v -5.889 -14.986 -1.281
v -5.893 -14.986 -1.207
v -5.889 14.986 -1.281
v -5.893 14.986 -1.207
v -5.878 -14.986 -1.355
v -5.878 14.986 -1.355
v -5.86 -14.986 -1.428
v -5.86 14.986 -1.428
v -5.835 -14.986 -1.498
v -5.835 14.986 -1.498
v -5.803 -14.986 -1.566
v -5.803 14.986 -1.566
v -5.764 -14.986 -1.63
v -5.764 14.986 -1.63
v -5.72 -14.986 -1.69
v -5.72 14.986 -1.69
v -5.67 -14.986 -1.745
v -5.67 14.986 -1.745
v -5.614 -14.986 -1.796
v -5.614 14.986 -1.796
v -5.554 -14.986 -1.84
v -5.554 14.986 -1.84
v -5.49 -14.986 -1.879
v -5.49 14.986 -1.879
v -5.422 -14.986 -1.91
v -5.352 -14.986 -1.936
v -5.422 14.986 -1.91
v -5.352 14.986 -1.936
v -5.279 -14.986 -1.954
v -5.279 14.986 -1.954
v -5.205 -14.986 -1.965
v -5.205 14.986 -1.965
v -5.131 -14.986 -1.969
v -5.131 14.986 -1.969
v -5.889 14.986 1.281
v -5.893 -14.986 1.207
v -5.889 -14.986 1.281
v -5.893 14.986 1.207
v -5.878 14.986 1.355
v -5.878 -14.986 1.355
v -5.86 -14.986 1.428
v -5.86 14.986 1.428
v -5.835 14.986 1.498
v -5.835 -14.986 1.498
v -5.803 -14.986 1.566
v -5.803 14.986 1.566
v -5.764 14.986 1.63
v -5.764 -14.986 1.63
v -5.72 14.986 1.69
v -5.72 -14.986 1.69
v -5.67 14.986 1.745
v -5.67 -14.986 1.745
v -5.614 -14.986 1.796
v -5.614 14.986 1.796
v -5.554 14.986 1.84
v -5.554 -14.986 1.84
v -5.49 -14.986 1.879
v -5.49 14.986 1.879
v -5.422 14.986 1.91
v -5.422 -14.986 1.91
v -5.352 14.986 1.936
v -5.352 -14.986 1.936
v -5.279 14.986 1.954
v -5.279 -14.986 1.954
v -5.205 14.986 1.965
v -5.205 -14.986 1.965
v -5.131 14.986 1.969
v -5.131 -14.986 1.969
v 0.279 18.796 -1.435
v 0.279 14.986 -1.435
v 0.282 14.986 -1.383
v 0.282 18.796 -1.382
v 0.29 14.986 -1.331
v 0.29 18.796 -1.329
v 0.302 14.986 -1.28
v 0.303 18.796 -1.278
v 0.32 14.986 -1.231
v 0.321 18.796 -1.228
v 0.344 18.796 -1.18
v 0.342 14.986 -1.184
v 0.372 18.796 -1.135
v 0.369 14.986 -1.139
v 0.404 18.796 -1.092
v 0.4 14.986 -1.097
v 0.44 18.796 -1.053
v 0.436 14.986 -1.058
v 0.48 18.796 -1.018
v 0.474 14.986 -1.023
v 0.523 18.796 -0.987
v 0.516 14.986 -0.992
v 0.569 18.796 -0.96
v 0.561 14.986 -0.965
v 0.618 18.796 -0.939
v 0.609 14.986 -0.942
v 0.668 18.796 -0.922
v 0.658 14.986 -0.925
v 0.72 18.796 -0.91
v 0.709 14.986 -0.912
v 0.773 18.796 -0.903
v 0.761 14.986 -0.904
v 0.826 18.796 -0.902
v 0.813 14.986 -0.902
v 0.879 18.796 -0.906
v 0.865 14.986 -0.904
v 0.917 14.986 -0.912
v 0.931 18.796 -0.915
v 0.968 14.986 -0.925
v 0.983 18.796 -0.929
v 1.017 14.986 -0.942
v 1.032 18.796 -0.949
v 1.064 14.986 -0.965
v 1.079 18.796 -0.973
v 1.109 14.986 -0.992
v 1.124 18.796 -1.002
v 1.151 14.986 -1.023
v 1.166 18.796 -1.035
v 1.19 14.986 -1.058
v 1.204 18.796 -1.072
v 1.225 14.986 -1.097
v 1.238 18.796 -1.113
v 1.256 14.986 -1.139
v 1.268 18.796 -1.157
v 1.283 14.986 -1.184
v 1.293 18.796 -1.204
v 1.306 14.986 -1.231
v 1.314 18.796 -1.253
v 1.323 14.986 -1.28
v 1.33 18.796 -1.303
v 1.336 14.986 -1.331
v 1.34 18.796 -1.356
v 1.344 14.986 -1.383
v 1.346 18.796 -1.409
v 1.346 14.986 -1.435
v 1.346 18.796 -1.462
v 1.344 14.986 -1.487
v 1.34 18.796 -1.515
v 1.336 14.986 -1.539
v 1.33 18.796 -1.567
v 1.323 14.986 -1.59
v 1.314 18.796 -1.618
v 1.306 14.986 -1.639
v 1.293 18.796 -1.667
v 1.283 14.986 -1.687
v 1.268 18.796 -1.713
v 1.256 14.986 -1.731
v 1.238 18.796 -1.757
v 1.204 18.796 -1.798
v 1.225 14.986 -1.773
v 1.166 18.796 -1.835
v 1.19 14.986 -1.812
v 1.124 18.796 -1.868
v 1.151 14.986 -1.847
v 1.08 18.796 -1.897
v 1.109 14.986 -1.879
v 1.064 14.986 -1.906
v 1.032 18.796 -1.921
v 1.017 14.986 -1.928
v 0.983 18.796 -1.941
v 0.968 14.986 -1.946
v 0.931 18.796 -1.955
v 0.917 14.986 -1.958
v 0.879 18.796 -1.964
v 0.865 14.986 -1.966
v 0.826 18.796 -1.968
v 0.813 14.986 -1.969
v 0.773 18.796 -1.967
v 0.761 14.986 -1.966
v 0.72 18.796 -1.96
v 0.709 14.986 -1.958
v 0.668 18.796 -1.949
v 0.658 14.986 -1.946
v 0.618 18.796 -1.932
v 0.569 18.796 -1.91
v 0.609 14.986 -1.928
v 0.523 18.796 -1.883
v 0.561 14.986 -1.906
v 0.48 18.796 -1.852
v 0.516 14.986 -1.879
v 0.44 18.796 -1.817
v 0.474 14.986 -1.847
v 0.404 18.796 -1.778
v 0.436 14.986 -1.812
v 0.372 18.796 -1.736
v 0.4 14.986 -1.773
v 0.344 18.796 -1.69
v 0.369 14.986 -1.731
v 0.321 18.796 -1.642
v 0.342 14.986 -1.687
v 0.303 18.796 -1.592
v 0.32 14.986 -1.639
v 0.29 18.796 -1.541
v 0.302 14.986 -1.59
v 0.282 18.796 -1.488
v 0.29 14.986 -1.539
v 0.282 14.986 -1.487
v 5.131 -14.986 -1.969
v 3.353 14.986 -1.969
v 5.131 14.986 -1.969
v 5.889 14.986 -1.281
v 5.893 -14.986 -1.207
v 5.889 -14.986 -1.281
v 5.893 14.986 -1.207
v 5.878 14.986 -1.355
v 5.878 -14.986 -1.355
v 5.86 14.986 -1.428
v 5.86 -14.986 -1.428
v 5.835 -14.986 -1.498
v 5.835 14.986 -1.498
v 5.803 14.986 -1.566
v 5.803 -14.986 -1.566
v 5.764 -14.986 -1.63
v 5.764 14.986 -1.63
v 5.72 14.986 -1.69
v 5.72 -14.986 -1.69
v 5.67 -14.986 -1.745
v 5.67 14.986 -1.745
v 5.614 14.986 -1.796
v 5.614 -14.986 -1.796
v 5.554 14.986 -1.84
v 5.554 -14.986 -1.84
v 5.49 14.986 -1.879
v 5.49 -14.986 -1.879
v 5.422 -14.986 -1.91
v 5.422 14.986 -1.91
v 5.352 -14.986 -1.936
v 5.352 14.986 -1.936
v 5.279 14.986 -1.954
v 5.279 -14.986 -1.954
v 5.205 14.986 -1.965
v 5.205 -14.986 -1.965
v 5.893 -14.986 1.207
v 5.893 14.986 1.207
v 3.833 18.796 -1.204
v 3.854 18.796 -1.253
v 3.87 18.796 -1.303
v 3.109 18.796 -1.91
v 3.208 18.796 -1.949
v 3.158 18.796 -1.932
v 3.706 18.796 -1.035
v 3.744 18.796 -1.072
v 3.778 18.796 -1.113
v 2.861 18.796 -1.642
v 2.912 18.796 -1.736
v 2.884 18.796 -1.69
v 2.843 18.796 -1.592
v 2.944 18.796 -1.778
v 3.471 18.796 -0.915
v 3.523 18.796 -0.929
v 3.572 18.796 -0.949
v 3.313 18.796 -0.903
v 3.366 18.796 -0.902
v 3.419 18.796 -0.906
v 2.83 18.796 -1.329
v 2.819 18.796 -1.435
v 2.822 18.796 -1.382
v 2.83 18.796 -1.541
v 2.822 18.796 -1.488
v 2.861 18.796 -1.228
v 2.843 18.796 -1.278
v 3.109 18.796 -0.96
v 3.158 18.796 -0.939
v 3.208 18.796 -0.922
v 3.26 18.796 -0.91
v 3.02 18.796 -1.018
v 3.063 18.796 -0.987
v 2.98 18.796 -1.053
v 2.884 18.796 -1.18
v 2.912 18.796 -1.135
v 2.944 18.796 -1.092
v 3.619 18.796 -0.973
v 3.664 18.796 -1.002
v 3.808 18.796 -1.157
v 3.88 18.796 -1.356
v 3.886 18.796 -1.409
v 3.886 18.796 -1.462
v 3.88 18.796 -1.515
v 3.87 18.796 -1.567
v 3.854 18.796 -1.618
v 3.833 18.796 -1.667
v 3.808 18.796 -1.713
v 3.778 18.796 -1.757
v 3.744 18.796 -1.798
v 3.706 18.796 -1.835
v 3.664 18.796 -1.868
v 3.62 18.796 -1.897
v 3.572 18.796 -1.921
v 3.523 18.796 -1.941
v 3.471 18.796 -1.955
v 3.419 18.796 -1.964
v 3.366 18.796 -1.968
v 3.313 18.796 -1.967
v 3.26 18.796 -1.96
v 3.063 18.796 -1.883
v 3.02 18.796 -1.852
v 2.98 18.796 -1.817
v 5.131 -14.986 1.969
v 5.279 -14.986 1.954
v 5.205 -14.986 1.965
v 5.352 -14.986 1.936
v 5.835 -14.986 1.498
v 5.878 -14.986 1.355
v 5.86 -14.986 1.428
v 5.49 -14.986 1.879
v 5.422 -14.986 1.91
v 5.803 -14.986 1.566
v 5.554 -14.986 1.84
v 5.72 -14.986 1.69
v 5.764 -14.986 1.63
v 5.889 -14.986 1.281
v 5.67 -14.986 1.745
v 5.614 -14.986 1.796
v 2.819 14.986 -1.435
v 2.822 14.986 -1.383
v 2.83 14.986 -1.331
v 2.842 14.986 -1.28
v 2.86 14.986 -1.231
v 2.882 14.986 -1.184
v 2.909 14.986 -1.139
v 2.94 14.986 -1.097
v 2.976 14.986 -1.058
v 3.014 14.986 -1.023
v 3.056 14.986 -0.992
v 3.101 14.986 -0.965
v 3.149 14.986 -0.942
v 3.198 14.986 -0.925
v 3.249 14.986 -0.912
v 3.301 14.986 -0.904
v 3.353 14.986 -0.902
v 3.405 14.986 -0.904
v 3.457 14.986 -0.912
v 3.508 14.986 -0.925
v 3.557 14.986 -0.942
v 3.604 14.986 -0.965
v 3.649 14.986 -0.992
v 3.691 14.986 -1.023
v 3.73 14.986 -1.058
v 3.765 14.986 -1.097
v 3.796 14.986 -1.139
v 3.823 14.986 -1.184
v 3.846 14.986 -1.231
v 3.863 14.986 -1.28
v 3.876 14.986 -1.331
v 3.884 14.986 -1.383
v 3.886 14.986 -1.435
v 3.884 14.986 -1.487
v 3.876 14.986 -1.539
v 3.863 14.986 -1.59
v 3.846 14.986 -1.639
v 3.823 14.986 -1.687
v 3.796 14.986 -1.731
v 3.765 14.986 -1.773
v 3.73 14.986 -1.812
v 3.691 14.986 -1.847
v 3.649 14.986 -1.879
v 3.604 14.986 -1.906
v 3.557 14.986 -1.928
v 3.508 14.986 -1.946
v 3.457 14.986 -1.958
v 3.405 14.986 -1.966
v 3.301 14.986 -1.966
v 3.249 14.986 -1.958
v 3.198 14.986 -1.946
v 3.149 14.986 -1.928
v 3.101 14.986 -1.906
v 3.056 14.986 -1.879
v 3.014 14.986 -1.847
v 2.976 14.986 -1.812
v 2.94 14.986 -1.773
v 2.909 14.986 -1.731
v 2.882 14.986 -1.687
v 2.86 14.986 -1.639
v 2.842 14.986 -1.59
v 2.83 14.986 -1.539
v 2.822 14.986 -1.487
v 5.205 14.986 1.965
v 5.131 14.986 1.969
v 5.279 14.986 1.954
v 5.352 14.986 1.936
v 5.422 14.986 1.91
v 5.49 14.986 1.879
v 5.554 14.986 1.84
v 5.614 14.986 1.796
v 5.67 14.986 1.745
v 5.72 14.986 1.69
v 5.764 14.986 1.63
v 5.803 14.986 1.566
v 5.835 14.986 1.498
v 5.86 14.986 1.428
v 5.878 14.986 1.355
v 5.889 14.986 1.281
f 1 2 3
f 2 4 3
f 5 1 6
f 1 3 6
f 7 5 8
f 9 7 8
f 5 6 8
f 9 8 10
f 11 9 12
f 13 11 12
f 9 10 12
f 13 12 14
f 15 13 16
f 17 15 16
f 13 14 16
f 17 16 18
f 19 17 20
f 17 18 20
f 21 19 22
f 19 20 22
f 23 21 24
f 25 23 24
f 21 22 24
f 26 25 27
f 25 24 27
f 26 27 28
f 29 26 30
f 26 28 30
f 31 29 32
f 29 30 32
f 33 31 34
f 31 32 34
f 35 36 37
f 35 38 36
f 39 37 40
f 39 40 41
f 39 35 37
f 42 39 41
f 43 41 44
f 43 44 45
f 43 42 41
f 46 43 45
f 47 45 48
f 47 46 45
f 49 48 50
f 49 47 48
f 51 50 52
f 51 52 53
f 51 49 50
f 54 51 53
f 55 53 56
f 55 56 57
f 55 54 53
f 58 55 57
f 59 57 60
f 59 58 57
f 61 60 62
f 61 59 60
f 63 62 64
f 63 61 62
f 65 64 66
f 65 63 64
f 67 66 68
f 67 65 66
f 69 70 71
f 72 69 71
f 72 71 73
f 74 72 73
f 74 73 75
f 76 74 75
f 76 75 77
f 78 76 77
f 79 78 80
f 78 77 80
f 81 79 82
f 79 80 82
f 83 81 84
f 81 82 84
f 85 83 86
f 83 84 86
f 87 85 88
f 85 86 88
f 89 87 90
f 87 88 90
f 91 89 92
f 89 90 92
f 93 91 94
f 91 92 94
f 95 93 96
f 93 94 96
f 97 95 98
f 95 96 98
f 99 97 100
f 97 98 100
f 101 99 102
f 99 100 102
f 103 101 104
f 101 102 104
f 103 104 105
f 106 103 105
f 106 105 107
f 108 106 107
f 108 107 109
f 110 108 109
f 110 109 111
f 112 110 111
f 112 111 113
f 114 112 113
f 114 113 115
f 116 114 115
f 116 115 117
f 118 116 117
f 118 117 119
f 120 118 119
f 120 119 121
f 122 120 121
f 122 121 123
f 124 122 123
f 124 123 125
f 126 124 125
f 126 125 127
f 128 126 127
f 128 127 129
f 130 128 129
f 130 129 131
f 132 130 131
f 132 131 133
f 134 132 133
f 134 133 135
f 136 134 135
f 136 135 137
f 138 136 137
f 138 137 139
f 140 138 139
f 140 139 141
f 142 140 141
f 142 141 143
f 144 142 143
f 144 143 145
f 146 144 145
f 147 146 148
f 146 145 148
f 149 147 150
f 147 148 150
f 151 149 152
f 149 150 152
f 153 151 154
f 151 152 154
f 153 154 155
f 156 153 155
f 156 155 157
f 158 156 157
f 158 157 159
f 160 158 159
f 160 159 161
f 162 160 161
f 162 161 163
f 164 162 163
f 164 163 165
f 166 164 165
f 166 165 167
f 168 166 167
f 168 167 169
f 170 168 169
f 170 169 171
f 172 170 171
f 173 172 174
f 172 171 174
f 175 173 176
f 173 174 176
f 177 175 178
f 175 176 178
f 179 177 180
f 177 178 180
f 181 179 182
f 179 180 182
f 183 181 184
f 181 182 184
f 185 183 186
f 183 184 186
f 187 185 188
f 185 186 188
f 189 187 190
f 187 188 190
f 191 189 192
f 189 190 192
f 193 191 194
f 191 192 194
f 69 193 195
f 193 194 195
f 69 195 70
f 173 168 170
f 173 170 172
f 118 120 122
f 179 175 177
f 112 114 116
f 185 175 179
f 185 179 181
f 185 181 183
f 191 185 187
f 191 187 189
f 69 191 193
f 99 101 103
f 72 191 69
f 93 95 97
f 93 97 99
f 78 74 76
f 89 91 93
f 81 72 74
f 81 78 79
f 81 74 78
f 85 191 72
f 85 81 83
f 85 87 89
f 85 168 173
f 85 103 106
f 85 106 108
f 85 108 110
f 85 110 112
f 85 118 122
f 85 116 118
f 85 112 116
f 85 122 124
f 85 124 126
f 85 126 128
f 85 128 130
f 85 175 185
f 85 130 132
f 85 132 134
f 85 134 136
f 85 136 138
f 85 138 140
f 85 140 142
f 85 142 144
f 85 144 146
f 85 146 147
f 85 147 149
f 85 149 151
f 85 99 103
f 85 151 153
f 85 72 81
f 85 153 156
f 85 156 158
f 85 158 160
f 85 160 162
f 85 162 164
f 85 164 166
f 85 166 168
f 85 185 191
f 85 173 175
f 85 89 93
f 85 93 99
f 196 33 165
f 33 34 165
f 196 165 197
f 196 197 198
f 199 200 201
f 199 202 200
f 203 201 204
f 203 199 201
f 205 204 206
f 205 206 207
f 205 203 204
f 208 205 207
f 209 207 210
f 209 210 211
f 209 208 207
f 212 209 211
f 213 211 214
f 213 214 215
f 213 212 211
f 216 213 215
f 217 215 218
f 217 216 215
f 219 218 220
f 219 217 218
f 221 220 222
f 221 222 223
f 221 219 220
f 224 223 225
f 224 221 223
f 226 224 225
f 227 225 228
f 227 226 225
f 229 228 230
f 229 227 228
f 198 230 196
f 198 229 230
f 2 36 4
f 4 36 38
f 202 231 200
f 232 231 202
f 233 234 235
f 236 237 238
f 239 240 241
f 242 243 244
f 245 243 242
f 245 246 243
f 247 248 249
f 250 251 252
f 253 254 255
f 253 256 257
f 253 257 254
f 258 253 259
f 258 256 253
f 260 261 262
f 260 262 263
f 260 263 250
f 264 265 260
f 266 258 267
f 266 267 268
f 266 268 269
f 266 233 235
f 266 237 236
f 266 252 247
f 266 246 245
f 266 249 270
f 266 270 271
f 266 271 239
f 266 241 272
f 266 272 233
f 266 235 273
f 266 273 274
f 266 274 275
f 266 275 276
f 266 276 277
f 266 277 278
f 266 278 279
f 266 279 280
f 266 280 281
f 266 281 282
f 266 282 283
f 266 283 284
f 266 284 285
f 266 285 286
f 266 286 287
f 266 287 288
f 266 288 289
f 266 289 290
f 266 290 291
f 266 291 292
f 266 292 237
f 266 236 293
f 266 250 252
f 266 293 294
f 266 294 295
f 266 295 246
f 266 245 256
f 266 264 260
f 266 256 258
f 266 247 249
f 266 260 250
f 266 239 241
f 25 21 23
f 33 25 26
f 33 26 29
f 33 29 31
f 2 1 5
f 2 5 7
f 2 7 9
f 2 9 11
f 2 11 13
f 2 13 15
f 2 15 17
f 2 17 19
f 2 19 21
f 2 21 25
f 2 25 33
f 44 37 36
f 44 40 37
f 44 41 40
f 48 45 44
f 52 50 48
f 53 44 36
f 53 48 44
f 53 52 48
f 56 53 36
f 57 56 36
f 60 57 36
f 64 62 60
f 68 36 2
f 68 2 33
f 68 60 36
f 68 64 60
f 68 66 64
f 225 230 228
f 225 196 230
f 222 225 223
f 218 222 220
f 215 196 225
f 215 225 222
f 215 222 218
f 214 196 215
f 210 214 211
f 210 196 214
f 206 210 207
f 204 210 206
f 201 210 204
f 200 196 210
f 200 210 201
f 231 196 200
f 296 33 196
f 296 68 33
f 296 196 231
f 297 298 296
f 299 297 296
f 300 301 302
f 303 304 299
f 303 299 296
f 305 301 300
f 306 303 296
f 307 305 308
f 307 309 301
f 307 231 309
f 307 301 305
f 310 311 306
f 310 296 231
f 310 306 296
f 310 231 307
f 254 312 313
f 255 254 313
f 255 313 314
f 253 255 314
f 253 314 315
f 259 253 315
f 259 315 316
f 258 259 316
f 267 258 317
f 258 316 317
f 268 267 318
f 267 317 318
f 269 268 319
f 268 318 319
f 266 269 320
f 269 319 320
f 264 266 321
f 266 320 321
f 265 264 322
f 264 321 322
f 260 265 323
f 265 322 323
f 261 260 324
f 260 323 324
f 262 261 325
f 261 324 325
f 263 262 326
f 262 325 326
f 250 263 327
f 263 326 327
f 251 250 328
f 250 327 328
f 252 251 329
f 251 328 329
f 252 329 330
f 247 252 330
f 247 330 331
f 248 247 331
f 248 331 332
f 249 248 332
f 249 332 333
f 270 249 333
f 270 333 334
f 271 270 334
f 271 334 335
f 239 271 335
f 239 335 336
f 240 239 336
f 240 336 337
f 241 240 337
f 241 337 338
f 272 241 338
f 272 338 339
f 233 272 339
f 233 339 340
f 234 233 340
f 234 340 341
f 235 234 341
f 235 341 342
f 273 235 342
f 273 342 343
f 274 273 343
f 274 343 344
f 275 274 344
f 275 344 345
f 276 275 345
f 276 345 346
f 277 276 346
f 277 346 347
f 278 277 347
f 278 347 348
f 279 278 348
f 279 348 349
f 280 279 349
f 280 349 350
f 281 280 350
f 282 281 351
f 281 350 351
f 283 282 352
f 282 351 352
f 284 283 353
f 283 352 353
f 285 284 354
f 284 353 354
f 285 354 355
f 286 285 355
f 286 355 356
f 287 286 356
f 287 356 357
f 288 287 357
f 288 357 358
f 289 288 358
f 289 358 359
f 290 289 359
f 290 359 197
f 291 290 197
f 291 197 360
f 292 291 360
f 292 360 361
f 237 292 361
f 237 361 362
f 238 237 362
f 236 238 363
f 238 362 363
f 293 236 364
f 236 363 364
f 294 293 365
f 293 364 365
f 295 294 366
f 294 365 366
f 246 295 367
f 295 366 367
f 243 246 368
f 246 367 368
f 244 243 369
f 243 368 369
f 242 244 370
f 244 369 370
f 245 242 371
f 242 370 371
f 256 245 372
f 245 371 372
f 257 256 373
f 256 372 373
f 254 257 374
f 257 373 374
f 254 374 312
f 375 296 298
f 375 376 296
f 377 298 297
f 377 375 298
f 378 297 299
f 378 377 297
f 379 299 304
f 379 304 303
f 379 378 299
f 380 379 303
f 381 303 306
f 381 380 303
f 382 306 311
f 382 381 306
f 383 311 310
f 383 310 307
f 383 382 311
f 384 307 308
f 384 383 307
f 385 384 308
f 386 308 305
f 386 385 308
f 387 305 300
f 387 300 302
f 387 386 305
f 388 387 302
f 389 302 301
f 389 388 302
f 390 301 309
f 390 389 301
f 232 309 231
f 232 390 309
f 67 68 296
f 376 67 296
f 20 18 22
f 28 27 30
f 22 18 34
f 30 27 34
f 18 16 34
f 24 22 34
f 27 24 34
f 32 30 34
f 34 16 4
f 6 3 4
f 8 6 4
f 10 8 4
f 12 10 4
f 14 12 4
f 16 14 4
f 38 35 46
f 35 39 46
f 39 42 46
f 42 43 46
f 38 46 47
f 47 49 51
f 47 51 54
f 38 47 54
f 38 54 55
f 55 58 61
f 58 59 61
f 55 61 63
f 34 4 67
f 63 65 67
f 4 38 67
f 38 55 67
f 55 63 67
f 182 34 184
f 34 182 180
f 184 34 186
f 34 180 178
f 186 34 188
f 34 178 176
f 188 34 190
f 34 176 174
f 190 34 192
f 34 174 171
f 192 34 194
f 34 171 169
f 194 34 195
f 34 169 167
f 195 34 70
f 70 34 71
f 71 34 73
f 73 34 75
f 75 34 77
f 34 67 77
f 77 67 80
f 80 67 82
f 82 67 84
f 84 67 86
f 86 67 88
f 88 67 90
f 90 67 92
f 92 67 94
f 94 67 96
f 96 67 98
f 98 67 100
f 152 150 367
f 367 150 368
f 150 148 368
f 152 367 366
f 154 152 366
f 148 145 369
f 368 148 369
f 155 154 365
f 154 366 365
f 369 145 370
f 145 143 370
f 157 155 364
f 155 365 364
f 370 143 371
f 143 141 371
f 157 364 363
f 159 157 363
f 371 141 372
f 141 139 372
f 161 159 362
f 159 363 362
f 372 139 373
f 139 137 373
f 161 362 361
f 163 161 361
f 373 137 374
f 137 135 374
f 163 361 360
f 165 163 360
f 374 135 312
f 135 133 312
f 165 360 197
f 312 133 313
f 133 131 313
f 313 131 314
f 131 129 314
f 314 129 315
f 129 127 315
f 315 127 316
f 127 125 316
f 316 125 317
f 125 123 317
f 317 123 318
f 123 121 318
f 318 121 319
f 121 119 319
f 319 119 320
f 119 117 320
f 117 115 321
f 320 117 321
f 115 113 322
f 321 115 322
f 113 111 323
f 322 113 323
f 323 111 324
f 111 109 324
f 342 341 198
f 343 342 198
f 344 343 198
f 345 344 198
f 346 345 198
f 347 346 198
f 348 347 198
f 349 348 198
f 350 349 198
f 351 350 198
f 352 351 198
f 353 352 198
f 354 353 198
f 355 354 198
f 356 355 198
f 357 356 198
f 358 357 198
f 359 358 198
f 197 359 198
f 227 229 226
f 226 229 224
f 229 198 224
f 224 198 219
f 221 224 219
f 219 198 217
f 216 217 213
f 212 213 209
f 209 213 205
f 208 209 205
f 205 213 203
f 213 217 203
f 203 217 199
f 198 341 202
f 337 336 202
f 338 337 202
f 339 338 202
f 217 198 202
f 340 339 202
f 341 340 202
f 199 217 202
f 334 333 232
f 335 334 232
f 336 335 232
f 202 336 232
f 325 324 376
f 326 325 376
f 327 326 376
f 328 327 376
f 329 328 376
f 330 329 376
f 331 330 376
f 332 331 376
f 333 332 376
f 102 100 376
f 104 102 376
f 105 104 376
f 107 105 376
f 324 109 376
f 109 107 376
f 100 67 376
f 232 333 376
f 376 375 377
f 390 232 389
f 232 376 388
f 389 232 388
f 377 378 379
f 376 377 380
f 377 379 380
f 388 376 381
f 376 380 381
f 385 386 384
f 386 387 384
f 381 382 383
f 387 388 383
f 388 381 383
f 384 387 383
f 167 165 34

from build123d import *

# Parameters (mm, degrees)
F0_W     = 11.7856
F0_H     = 29.972
F1_DEPTH = 1.9685
F2_R     = 0.762
F3_R     = 0.5334
F4_DEPTH = 3.81


with BuildPart() as f1:
    # F0 (on Top) → F1 (new body, symmetric)
    with BuildSketch(Plane.XY):
        Rectangle(F0_W, F0_H)
    extrude(amount=F1_DEPTH, both=True)

    # F2
    f2_edges = [f1.edges().sort_by_distance(p)[0] for p in [
        (-5.8928, 0, 1.9685),
        (-5.8928, 0, -1.9685),
        (5.8928, 0, -1.9685),
        (5.8928, 0, 1.9685),
    ]]
    fillet(f2_edges, radius=F2_R)

    # F3 (on face) → F4 (join)
    with BuildSketch(Plane(origin=(0, 14.986, 0), x_dir=(-1, 0, 0), z_dir=(0, 1, 0))):
        with Locations((-3.3528, -1.4351)):
            Circle(F3_R)
        with Locations((-0.8128, -1.4351)):
            Circle(F3_R)
    extrude(amount=F4_DEPTH)


solid = f1.part
